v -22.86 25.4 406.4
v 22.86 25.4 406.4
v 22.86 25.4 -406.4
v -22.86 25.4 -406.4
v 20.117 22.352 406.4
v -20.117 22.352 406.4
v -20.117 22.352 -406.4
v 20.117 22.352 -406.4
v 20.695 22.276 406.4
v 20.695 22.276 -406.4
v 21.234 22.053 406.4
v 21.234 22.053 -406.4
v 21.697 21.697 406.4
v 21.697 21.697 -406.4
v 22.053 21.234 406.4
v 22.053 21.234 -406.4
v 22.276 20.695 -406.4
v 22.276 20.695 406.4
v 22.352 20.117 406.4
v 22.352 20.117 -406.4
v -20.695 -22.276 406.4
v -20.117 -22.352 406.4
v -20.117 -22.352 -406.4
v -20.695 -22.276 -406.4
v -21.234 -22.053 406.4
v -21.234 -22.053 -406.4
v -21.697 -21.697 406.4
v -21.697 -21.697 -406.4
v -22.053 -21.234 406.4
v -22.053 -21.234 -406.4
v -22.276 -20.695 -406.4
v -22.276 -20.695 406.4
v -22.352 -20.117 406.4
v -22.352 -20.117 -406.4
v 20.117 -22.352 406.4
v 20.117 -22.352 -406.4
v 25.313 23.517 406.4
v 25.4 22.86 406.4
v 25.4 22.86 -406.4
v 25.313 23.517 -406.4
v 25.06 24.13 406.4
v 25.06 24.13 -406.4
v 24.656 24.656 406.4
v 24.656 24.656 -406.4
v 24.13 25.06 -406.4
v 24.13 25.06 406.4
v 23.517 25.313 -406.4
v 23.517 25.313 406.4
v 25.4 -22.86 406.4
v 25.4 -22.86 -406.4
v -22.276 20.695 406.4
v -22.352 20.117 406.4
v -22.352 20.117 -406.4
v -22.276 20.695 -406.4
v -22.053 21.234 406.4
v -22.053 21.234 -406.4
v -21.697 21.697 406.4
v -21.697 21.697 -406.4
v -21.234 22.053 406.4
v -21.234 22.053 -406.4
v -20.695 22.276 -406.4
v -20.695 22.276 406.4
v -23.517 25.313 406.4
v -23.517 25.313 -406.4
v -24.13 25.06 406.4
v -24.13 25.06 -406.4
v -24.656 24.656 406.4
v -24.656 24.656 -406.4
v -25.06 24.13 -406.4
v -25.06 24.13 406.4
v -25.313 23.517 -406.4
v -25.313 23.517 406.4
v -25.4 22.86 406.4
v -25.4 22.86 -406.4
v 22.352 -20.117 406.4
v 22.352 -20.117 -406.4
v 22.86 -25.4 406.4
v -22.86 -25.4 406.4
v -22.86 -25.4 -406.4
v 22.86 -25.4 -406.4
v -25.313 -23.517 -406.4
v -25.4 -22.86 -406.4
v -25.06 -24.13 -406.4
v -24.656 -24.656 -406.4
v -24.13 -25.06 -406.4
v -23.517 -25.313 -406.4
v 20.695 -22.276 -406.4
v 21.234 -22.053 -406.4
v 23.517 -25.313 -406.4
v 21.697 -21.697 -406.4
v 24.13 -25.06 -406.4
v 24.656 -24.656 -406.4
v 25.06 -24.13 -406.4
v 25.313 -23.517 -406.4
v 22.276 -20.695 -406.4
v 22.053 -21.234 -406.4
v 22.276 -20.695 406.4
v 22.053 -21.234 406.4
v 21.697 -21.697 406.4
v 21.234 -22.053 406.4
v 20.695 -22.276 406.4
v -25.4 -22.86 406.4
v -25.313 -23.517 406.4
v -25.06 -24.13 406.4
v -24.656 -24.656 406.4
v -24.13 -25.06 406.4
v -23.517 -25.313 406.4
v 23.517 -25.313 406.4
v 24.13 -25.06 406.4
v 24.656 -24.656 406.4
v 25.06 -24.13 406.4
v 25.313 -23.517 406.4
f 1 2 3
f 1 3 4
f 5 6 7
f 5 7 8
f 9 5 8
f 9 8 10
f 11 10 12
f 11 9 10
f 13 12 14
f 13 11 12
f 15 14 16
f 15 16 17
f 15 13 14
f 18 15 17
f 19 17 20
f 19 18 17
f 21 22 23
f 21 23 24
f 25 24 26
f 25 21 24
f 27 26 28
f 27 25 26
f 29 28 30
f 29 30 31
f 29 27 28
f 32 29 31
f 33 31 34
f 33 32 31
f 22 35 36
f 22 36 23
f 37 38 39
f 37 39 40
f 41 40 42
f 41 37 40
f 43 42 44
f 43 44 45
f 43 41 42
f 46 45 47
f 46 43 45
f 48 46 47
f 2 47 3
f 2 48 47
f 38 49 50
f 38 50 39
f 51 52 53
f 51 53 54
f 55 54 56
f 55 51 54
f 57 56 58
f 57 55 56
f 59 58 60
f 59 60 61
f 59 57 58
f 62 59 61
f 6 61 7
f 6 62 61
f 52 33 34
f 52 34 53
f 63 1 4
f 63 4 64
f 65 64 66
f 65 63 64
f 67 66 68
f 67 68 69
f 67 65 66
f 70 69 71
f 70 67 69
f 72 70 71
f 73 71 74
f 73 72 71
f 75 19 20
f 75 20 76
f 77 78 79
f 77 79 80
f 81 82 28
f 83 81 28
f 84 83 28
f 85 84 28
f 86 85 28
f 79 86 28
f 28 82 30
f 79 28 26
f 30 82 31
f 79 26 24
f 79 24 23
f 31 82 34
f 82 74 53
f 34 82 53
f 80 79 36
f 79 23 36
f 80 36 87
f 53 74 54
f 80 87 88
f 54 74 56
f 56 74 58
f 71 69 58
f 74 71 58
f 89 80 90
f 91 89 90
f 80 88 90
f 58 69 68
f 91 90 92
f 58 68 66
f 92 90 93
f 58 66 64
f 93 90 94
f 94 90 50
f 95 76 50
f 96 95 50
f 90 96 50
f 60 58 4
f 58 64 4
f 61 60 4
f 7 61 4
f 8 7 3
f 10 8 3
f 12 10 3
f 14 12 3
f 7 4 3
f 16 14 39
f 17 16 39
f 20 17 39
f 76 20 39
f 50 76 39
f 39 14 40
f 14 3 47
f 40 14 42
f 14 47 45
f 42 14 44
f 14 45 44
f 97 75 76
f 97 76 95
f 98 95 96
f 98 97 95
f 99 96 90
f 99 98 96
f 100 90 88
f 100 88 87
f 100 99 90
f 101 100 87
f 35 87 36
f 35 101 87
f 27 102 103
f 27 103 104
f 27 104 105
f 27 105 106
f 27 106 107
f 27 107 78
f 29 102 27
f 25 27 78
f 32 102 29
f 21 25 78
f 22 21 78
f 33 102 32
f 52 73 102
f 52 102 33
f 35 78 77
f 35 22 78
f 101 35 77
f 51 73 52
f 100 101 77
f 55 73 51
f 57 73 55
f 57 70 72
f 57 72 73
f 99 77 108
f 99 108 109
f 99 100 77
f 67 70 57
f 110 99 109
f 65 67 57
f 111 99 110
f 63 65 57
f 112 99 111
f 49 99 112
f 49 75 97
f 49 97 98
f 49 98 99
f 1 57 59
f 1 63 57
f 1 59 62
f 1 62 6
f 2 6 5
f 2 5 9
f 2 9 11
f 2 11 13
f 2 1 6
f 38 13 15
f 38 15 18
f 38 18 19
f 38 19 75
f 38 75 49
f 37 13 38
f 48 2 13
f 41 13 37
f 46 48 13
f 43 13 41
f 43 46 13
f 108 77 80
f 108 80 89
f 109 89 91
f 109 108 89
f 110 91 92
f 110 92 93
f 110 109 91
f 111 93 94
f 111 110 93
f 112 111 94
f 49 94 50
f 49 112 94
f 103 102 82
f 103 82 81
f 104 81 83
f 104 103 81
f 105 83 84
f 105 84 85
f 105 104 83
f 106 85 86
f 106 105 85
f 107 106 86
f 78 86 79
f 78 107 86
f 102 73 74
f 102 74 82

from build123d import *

# Parameters (mm, degrees)
BOSS_EXTRU_1_DEPTH = 812.8


with BuildPart() as part:
    # Esquisse1 → Boss.-Extru.1 (new body)
    with BuildSketch(Plane.XY.offset(406.4)):
        with BuildLine():
            Line((25.4, -22.86), (25.4, 22.86))
            ThreePointArc((25.4, 22.86), (24.656051224, 24.656051224), (22.86, 25.4))
            Line((22.86, 25.4), (-22.86, 25.4))
            ThreePointArc((-22.86, 25.4), (-24.656051224, 24.656051224), (-25.4, 22.86))
            Line((-25.4, 22.86), (-25.4, -22.86))
            ThreePointArc((-25.4, -22.86), (-24.656051224, -24.656051224), (-22.86, -25.4))
            Line((-22.86, -25.4), (22.86, -25.4))
            ThreePointArc((22.86, -25.4), (24.656051224, -24.656051224), (25.4, -22.86))
        make_face()
        with BuildLine():
            Line((-20.1168, 22.352), (20.1168, 22.352))
            ThreePointArc((20.1168, 22.352), (21.697325077, 21.697325077), (22.352, 20.1168))
            Line((22.352, 20.1168), (22.352, -20.1168))
            ThreePointArc((22.352, -20.1168), (21.697325077, -21.697325077), (20.1168, -22.352))
            Line((20.1168, -22.352), (-20.1168, -22.352))
            ThreePointArc((-20.1168, -22.352), (-21.697325077, -21.697325077), (-22.352, -20.1168))
            Line((-22.352, -20.1168), (-22.352, 20.1168))
            ThreePointArc((-22.352, 20.1168), (-21.697325077, 21.697325077), (-20.1168, 22.352))
        make_face(mode=Mode.SUBTRACT)
    extrude(amount=-BOSS_EXTRU_1_DEPTH)


solid = part.part
